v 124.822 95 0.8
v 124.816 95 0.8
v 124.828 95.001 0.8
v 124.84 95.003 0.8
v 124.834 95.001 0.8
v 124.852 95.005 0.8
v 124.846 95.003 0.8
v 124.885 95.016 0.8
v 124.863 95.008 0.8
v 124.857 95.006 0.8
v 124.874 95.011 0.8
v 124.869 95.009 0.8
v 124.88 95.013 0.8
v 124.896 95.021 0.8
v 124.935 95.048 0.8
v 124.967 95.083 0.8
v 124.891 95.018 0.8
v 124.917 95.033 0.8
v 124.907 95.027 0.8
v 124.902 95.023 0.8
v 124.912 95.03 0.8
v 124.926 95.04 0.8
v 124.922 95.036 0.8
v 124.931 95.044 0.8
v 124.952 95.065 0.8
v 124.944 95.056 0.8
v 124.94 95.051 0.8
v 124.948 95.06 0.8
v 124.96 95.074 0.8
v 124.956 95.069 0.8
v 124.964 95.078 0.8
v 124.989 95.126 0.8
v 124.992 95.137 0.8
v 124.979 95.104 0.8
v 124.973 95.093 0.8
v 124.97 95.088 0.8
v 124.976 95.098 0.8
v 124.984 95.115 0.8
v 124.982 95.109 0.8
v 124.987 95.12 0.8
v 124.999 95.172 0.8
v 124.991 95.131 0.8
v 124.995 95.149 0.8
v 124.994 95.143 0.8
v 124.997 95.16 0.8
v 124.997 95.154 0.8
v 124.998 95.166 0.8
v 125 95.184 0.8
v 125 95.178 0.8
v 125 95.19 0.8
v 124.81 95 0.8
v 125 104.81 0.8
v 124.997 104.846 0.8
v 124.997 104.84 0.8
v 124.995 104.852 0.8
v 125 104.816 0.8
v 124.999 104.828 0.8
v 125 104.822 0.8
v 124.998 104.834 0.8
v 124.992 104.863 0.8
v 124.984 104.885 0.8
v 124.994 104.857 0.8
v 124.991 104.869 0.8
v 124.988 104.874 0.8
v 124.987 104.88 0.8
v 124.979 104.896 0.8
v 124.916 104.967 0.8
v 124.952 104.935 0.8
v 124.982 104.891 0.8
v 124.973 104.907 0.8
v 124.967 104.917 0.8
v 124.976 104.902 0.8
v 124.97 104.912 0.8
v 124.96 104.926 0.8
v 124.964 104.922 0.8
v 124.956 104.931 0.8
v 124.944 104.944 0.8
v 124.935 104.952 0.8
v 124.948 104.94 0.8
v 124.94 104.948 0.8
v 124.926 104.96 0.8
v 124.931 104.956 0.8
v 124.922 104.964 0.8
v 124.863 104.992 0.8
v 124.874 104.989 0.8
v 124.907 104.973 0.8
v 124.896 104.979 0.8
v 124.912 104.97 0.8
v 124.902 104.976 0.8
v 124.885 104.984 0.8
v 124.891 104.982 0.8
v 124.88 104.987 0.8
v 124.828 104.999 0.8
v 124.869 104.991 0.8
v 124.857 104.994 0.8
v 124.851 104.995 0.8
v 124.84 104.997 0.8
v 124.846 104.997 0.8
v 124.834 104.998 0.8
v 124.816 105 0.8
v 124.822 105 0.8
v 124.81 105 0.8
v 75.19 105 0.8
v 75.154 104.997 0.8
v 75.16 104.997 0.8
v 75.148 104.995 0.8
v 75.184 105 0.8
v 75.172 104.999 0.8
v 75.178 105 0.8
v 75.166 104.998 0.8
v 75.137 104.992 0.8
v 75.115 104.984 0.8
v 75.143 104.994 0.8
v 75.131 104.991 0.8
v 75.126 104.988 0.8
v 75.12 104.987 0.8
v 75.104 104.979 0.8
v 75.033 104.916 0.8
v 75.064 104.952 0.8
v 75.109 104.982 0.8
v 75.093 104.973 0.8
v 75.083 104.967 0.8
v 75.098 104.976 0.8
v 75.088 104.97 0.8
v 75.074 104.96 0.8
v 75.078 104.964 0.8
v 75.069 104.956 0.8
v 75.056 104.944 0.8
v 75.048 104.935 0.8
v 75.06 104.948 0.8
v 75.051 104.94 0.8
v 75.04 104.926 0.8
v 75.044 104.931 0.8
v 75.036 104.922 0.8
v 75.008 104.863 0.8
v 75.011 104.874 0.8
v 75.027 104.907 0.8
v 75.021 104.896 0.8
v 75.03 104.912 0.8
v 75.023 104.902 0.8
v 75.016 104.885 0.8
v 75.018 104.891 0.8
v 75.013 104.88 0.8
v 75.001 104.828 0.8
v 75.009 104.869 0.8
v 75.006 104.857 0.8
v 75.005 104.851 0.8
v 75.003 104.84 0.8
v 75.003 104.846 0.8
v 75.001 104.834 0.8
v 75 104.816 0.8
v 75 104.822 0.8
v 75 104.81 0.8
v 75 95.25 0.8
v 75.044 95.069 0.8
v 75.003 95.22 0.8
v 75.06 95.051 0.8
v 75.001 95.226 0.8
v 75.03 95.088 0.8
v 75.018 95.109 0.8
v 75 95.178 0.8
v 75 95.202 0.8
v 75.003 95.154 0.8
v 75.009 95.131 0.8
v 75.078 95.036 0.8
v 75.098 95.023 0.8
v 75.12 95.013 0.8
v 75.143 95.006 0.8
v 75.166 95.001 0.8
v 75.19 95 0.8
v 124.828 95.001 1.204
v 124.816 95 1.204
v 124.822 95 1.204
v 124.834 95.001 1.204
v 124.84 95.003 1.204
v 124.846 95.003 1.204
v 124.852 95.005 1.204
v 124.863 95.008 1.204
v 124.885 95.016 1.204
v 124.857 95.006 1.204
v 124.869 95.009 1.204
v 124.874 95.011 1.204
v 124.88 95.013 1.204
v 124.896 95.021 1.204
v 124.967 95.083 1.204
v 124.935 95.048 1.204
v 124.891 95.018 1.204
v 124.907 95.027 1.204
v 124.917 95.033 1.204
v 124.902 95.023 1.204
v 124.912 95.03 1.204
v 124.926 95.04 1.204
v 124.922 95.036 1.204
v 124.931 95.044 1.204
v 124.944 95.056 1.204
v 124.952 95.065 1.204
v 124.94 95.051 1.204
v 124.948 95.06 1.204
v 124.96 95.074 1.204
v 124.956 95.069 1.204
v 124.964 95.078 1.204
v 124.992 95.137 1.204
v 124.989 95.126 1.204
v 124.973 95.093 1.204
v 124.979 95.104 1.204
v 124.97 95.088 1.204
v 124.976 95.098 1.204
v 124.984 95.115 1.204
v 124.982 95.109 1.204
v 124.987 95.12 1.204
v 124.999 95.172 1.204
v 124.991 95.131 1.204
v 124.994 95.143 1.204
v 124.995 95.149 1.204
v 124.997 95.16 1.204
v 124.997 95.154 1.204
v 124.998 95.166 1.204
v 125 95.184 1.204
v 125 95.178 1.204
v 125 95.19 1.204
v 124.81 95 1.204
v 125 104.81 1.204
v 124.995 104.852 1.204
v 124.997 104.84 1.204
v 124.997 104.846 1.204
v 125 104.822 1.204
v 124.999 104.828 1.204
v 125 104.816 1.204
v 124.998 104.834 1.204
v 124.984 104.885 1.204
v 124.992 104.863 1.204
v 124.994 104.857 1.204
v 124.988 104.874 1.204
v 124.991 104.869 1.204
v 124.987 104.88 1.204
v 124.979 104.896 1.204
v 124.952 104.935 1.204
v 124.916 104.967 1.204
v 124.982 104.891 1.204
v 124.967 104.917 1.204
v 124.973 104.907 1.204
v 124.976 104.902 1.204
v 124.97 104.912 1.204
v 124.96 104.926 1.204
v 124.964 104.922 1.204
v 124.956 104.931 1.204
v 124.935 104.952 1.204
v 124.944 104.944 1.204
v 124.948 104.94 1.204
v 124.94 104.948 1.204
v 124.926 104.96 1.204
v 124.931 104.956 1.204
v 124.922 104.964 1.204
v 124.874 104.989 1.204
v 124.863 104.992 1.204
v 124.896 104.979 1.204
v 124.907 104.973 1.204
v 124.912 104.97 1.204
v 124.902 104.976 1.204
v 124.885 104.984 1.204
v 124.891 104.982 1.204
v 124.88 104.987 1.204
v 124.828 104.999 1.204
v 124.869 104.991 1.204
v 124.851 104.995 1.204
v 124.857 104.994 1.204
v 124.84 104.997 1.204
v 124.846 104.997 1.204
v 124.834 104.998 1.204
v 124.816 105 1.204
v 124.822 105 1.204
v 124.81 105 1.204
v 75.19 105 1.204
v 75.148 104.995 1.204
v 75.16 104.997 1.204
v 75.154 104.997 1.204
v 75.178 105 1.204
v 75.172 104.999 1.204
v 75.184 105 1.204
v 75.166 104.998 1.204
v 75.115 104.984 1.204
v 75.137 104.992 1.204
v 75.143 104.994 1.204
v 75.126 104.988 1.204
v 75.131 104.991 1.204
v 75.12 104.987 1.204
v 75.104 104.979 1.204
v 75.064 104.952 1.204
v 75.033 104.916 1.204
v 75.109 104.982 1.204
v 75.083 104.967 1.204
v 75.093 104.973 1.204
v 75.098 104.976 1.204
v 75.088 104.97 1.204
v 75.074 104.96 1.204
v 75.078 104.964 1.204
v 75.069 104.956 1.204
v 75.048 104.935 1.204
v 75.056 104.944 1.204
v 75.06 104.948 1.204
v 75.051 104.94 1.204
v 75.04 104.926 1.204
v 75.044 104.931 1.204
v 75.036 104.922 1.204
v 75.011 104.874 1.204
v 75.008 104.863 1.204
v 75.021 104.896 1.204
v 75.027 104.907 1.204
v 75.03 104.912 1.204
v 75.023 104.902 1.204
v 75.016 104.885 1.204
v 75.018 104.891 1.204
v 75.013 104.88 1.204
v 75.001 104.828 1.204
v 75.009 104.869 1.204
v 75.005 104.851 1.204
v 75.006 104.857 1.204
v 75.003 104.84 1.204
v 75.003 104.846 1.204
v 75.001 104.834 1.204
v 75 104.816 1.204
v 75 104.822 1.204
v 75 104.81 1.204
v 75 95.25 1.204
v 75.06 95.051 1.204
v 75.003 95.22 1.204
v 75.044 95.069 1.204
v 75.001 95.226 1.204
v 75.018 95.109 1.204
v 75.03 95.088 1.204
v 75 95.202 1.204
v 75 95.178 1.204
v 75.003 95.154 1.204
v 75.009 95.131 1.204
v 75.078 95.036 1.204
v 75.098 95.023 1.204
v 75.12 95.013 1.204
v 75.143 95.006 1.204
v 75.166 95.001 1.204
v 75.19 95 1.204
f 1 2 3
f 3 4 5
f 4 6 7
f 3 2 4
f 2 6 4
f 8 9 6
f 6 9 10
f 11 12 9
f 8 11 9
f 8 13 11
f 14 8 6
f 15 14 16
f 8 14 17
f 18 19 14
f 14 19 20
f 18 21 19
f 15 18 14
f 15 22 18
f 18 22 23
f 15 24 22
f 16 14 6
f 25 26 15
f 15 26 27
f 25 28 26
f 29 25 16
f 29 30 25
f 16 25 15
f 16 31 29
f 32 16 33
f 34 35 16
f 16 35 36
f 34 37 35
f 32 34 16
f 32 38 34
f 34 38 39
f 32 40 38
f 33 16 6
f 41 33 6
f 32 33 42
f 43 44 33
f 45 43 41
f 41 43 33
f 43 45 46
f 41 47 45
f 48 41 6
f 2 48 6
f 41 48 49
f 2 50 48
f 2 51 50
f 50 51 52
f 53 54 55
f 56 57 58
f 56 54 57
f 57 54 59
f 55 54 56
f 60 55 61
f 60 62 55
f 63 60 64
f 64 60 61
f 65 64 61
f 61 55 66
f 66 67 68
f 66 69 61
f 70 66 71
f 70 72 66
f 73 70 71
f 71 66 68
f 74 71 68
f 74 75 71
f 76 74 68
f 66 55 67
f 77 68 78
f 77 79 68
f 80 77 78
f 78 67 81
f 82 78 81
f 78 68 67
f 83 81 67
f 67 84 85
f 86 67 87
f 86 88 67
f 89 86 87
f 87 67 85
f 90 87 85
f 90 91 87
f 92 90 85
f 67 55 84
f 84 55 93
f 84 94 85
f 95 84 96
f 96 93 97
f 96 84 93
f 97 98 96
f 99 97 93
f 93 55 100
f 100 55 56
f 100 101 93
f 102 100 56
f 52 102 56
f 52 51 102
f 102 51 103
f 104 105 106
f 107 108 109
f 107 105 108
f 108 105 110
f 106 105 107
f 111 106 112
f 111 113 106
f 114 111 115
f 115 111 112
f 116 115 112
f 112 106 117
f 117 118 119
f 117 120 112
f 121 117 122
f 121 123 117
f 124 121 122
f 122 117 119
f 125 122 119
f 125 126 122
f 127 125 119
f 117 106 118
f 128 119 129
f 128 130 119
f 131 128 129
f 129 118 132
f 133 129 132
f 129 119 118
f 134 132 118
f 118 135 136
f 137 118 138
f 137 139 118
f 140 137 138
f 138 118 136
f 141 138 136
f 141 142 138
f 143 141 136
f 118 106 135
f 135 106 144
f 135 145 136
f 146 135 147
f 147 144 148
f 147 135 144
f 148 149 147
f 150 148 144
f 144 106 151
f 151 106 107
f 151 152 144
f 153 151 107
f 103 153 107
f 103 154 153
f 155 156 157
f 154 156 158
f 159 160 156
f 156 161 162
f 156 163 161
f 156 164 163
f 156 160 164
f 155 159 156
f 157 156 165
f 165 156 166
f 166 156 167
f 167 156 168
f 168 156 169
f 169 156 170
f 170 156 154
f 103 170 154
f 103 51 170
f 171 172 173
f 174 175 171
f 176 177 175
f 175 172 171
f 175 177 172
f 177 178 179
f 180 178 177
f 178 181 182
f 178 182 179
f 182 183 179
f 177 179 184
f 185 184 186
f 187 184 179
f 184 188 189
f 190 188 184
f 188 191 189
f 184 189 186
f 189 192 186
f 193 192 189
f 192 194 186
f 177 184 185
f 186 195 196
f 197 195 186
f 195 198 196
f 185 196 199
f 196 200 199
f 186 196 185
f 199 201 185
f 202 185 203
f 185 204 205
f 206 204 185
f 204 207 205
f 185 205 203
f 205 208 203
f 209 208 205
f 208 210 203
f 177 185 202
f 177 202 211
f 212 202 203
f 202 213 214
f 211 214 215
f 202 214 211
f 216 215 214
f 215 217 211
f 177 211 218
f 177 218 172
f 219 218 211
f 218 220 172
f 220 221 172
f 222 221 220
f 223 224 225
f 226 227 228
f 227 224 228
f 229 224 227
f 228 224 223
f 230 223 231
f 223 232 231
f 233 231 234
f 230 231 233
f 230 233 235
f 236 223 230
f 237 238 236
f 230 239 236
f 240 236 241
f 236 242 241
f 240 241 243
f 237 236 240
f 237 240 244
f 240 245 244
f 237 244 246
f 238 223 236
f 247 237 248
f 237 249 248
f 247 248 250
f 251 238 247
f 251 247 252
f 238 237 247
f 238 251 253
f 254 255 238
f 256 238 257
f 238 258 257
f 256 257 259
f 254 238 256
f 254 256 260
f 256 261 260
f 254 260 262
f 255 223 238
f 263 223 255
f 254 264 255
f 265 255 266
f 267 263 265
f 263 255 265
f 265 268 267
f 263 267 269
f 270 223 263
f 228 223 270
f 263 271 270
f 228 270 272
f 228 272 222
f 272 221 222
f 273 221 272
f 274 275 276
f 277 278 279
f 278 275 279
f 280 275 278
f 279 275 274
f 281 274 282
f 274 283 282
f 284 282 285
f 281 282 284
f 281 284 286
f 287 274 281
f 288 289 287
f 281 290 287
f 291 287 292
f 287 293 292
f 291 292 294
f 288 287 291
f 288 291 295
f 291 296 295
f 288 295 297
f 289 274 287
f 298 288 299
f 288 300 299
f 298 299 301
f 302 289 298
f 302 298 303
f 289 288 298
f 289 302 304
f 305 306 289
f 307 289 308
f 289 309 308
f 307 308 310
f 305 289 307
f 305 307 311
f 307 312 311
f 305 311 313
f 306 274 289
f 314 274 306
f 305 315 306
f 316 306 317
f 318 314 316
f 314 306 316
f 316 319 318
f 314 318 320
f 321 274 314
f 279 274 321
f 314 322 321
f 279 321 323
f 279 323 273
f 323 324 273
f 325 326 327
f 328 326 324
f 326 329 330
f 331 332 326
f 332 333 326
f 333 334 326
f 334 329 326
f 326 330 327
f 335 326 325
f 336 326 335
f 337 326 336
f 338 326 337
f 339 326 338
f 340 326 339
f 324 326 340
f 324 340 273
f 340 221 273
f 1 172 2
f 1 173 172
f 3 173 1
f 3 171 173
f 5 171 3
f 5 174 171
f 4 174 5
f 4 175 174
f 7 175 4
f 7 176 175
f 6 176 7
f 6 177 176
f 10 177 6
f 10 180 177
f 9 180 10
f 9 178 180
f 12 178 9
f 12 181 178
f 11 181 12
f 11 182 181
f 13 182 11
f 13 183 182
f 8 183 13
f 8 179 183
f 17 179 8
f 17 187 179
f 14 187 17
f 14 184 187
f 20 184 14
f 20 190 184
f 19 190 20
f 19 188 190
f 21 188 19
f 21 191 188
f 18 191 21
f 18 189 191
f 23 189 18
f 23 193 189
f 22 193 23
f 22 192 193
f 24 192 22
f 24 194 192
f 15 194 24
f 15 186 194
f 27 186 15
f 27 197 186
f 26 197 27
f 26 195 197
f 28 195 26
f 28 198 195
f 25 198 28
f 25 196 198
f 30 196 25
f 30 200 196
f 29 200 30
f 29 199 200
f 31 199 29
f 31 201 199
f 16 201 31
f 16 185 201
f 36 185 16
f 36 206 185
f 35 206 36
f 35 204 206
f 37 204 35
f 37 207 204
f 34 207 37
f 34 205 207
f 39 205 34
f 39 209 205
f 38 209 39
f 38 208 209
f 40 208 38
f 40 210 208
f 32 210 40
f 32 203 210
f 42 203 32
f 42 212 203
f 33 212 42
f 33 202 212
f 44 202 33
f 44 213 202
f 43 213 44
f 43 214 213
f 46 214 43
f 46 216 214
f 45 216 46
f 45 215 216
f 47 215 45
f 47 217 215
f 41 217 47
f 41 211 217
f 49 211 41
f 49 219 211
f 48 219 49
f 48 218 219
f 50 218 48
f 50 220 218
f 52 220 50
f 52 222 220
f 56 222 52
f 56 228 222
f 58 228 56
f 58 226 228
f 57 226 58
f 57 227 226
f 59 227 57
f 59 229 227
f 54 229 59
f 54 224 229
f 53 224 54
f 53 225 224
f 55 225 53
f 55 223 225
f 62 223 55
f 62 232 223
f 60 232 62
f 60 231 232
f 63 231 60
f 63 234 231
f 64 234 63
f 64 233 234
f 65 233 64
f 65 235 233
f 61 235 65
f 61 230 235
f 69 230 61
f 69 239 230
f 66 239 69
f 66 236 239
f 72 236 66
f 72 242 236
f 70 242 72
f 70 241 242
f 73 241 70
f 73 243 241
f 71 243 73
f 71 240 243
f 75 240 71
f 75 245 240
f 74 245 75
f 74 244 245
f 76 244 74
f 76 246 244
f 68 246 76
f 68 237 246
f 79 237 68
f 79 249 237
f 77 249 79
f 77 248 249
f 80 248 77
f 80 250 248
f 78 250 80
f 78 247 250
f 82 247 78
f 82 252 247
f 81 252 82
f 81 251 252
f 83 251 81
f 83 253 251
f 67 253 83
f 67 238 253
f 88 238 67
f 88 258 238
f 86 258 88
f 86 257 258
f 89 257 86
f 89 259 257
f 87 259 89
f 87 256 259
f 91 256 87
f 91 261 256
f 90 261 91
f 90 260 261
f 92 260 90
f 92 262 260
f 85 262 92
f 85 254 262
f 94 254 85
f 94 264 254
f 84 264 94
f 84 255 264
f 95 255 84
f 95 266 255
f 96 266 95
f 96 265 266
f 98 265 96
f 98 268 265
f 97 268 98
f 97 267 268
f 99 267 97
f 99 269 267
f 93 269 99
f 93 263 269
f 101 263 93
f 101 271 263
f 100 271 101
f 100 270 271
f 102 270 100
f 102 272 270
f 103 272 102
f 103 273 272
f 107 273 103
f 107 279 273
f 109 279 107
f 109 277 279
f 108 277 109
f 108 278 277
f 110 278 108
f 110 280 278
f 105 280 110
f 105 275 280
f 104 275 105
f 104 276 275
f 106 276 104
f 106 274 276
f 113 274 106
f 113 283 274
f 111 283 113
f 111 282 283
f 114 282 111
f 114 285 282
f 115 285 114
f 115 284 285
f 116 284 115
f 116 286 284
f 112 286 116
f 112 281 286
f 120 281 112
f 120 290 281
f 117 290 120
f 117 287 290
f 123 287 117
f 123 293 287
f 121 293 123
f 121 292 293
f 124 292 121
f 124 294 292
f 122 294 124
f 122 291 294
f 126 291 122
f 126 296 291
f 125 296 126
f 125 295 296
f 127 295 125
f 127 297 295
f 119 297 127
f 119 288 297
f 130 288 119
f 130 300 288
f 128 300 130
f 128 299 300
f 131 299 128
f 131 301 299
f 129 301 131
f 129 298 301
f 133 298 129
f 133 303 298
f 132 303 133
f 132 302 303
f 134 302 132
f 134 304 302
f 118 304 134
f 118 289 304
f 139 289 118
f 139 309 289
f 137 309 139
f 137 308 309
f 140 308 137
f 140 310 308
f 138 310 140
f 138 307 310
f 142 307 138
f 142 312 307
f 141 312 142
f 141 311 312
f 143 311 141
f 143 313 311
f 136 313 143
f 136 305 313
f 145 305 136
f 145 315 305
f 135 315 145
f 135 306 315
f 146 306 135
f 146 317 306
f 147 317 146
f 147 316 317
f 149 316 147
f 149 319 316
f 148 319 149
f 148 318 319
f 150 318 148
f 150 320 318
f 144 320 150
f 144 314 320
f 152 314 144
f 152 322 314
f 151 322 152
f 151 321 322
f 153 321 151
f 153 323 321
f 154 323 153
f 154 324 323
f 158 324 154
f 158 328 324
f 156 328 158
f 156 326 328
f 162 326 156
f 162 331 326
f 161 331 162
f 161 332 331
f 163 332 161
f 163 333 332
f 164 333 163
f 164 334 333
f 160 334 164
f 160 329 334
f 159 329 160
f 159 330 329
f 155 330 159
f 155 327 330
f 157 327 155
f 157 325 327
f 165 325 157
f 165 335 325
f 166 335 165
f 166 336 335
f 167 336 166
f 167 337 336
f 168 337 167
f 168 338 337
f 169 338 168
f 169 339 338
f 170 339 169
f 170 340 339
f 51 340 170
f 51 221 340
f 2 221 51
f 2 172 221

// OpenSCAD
module drawBasicShape(x1, y1, x2, y2, width)
{
	length = sqrt((x1-x2)*(x1-x2) + (y1-y2)*(y1-y2));
	if (width!=0.0) {
		square(size = [width, length], center = false);
		translate([width/2.0, 0, 0]) circle(d=width);
		translate([width/2.0, length, 0]) circle(d=width);
	}
}

module translateAndRotate(x1, y1, x2, y2, width)
{
	if (width != 0.0) {
		angle = atan((y2-y1)/(x2-x1)) +270;
		if (x2>=x1) {
			translate([x1, y1, 0.0]) rotate([0.0, 0.0, angle]) translate([-width/2.0, 0.0, 0.0]) scale([1.0, 1.0, 1.0]) drawBasicShape(x1, y1, x2, y2, width);
		}
		else {
			translate([x1, y1, 0.0]) rotate([0.0, 0.0, angle+180]) translate([-width/2.0, 0.0, 0.0]) scale([1.0, 1.0, 1.0]) drawBasicShape(x1, y1, x2, y2, width);		}
	}
}

$fn=50;

points1 = [
[75.77800000, 95.77800000, 0.00000000],
[124.22200000, 95.77800000, 0.37999548],
[124.22200000, 104.22200000, 0.37997788],
[75.77800000, 104.22200000, 0.37999672],
[75.77800000, 95.83800000, 0.37997423],
[75.48400000, 95.48400000, 0.00000000],
[124.51600000, 95.48400000, 0.37999868],
[124.51600000, 104.51600000, 0.37998977],
[75.48400000, 104.51600000, 0.37999746],
[75.48400000, 95.54400000, 0.37999314],
[75.19000000, 95.19000000, 0.00000000],
[124.81000000, 95.19000000, 0.37999939],
[124.81000000, 104.81000000, 0.38000021],
[75.19000000, 104.81000000, 0.38000060],
[75.19000000, 95.25000000, 0.37999715],
[75.53600000, 95.39000000, 0.00000000],
[76.11100000, 95.94600000, 0.00000000],
[75.94600000, 96.11100000, 0.38038683],
[75.94600000, 96.52800000, 0.38073291],
[76.52800000, 95.94600000, 0.38070298],
[76.94500000, 95.94600000, 0.38073291],
[75.94600000, 96.94500000, 0.38071263],
[75.94600000, 97.36200000, 0.38087711],
[77.36200000, 95.94600000, 0.38071660],
[77.77900000, 95.94600000, 0.38087711],
[75.94600000, 97.77900000, 0.38074196],
[75.94600000, 98.19600000, 0.38087711],
[78.19600000, 95.94600000, 0.38075792],
[78.61300000, 95.94600000, 0.38073291],
[75.94600000, 98.61300000, 0.38076888],
[75.94600000, 99.03000000, 0.38073291],
[79.03000000, 95.94600000, 0.38077689],
[79.44700000, 95.94600000, 0.38073291],
[75.94600000, 99.44700000, 0.38078298],
[75.94600000, 99.86400000, 0.38073291],
[79.86400000, 95.94600000, 0.38077693],
[80.28100000, 95.94600000, 0.38073291],
[75.94600000, 100.28100000, 0.38078185],
[75.94600000, 100.69800000, 0.38073291],
[80.69800000, 95.94600000, 0.38078590],
[81.11500000, 95.94600000, 0.38073291],
[75.94600000, 101.11500000, 0.38078108],
[75.94600000, 101.53300000, 0.38002742],
[81.53300000, 95.94600000, 0.38073180],
[81.95000000, 95.94600000, 0.38073291],
[75.94600000, 101.95000000, 0.38073848],
[75.94600000, 102.36700000, 0.38073291],
[82.36700000, 95.94600000, 0.38073768],
[82.78400000, 95.94600000, 0.38087711],
[75.94600000, 102.78400000, 0.38073697],
[75.94600000, 103.20100000, 0.38087711],
[83.20100000, 95.94600000, 0.38074221],
[83.61800000, 95.94600000, 0.38073291],
[75.94600000, 103.61800000, 0.38075242],
[75.95600000, 104.02400000, 0.38107952],
[84.03500000, 95.94600000, 0.38075541],
[84.45200000, 95.94600000, 0.38073291],
[76.34400000, 104.05400000, 0.38075745],
[76.76100000, 104.05400000, 0.38073291],
[84.86900000, 95.94600000, 0.38075745],
[85.28600000, 95.94600000, 0.38073291],
[77.17800000, 104.05400000, 0.38075745],
[77.59500000, 104.05400000, 0.38073291],
[85.70300000, 95.94600000, 0.38075745],
[86.12000000, 95.94600000, 0.38073291],
[78.01200000, 104.05400000, 0.38075745],
[78.42900000, 104.05400000, 0.38073291],
[86.53700000, 95.94600000, 0.38075745],
[86.95400000, 95.94600000, 0.38073291],
[78.84600000, 104.05400000, 0.38075745],
[79.26300000, 104.05400000, 0.38073291],
[87.37100000, 95.94600000, 0.38075745],
[87.78900000, 95.94600000, 0.38002742],
[79.68000000, 104.05400000, 0.38073927],
[80.09700000, 104.05400000, 0.38073291],
[88.20600000, 95.94600000, 0.38073927],
[88.62300000, 95.94600000, 0.38073291],
[80.51400000, 104.05400000, 0.38073927],
[80.93200000, 104.05400000, 0.38002742],
[89.04000000, 95.94600000, 0.38075745],
[89.45700000, 95.94600000, 0.38073291],
[81.34900000, 104.05400000, 0.38075745],
[81.76600000, 104.05400000, 0.38073291],
[89.87400000, 95.94600000, 0.38075745],
[90.29100000, 95.94600000, 0.38073291],
[82.18300000, 104.05400000, 0.38075745],
[82.60000000, 104.05400000, 0.38073291],
[90.70800000, 95.94600000, 0.38075745],
[91.12500000, 95.94600000, 0.38073291],
[83.01700000, 104.05400000, 0.38075745],
[83.43400000, 104.05400000, 0.38073291],
[91.54200000, 95.94600000, 0.38075745],
[91.95900000, 95.94600000, 0.38073291],
[83.85100000, 104.05400000, 0.38075745],
[84.26800000, 104.05400000, 0.38073291],
[92.37600000, 95.94600000, 0.38075745],
[92.79300000, 95.94600000, 0.38073291],
[84.68500000, 104.05400000, 0.38075745],
[85.10200000, 104.05400000, 0.38073291],
[93.21000000, 95.94600000, 0.38075745],
[93.62700000, 95.94600000, 0.38073291],
[85.51900000, 104.05400000, 0.38075745],
[85.93600000, 104.05400000, 0.38073291],
[94.04400000, 95.94600000, 0.38075745],
[94.46200000, 95.94600000, 0.38002742],
[86.35300000, 104.05400000, 0.38073927],
[86.77000000, 104.05400000, 0.38073291],
[94.87900000, 95.94600000, 0.38073927],
[95.29600000, 95.94600000, 0.38073291],
[87.18800000, 104.05400000, 0.38075745],
[87.60500000, 104.05400000, 0.38073291],
[95.71300000, 95.94600000, 0.38075745],
[96.13000000, 95.94600000, 0.38073291],
[88.02200000, 104.05400000, 0.38075745],
[88.43900000, 104.05400000, 0.38073291],
[96.54700000, 95.94600000, 0.38075745],
[96.96400000, 95.94600000, 0.38073291],
[88.85600000, 104.05400000, 0.38075745],
[89.27300000, 104.05400000, 0.38073291],
[97.38100000, 95.94600000, 0.38075745],
[97.79800000, 95.94600000, 0.38087711],
[89.69000000, 104.05400000, 0.38075221],
[90.10700000, 104.05400000, 0.38087711],
[98.21500000, 95.94600000, 0.38075221],
[98.63200000, 95.94600000, 0.38087711],
[90.52400000, 104.05400000, 0.38075221],
[90.94100000, 104.05400000, 0.38087711],
[99.04900000, 95.94600000, 0.38075221],
[99.46600000, 95.94600000, 0.38087711],
[91.35800000, 104.05400000, 0.38075221],
[91.77500000, 104.05400000, 0.38087711],
[99.88300000, 95.94600000, 0.38075221],
[100.30000000, 95.94600000, 0.38087711],
[92.19200000, 104.05400000, 0.38075221],
[92.60900000, 104.05400000, 0.38087711],
[100.71800000, 95.94600000, 0.38073402],
[101.13500000, 95.94600000, 0.38087711],
[93.02600000, 104.05400000, 0.38073402],
[93.44400000, 104.05400000, 0.38017128],
[101.55200000, 95.94600000, 0.38075221],
[101.96900000, 95.94600000, 0.38087711],
[93.86100000, 104.05400000, 0.38075221],
[94.27800000, 104.05400000, 0.38087711],
[102.38600000, 95.94600000, 0.38075221],
[102.80300000, 95.94600000, 0.38087711],
[94.69500000, 104.05400000, 0.38075221],
[95.11200000, 104.05400000, 0.38087711],
[103.22000000, 95.94600000, 0.38075221],
[103.63700000, 95.94600000, 0.38087711],
[95.52900000, 104.05400000, 0.38075221],
[95.94600000, 104.05400000, 0.38087711],
[104.05400000, 95.94600000, 0.38075221],
[104.47100000, 95.94600000, 0.38087711],
[96.36300000, 104.05400000, 0.38075221],
[96.78000000, 104.05400000, 0.38087711],
[104.88800000, 95.94600000, 0.38075221],
[105.30500000, 95.94600000, 0.38087711],
[97.19700000, 104.05400000, 0.38075221],
[97.61400000, 104.05400000, 0.38087711],
[105.72200000, 95.94600000, 0.38075221],
[106.13900000, 95.94600000, 0.38087711],
[98.03100000, 104.05400000, 0.38075221],
[98.44800000, 104.05400000, 0.38087711],
[106.55600000, 95.94600000, 0.38075221],
[106.97300000, 95.94600000, 0.38087711],
[98.86500000, 104.05400000, 0.38075221],
[99.28200000, 104.05400000, 0.38087711],
[107.39100000, 95.94600000, 0.38073402],
[107.80800000, 95.94600000, 0.38087711],
[99.69900000, 104.05400000, 0.38073402],
[100.11700000, 104.05400000, 0.38017128],
[108.22500000, 95.94600000, 0.38075221],
[108.64200000, 95.94600000, 0.38087711],
[100.53400000, 104.05400000, 0.38075221],
[100.95100000, 104.05400000, 0.38087711],
[109.05900000, 95.94600000, 0.38075221],
[109.47600000, 95.94600000, 0.38087711],
[101.36800000, 104.05400000, 0.38075221],
[101.78500000, 104.05400000, 0.38087711],
[109.89300000, 95.94600000, 0.38075221],
[110.31000000, 95.94600000, 0.38087711],
[102.20200000, 104.05400000, 0.38075745],
[102.61900000, 104.05400000, 0.38073291],
[110.72700000, 95.94600000, 0.38075745],
[111.14400000, 95.94600000, 0.38073291],
[103.03600000, 104.05400000, 0.38075745],
[103.45300000, 104.05400000, 0.38073291],
[111.56100000, 95.94600000, 0.38075745],
[111.97800000, 95.94600000, 0.38073291],
[103.87000000, 104.05400000, 0.38075745],
[104.28700000, 104.05400000, 0.38073291],
[112.39500000, 95.94600000, 0.38075745],
[112.81200000, 95.94600000, 0.38073291],
[104.70400000, 104.05400000, 0.38075745],
[105.12100000, 104.05400000, 0.38073291],
[113.22900000, 95.94600000, 0.38075745],
[113.64700000, 95.94600000, 0.38002742],
[105.53800000, 104.05400000, 0.38073927],
[105.95500000, 104.05400000, 0.38073291],
[114.06400000, 95.94600000, 0.38073927],
[114.48100000, 95.94600000, 0.38073291],
[106.37300000, 104.05400000, 0.38075745],
[106.79000000, 104.05400000, 0.38073291],
[114.89800000, 95.94600000, 0.38075745],
[115.31500000, 95.94600000, 0.38073291],
[107.20700000, 104.05400000, 0.38075745],
[107.62400000, 104.05400000, 0.38073291],
[115.73200000, 95.94600000, 0.38075745],
[116.14900000, 95.94600000, 0.38073291],
[108.04100000, 104.05400000, 0.38075745],
[108.45800000, 104.05400000, 0.38073291],
[116.56600000, 95.94600000, 0.38075745],
[116.98300000, 95.94600000, 0.38073291],
[108.87500000, 104.05400000, 0.38075745],
[109.29200000, 104.05400000, 0.38073291],
[117.40000000, 95.94600000, 0.38075745],
[117.81700000, 95.94600000, 0.38073291],
[109.70900000, 104.05400000, 0.38075745],
[110.12600000, 104.05400000, 0.38073291],
[118.23400000, 95.94600000, 0.38075745],
[118.65100000, 95.94600000, 0.38073291],
[110.54300000, 104.05400000, 0.38075745],
[110.96000000, 104.05400000, 0.38073291],
[119.06800000, 95.94600000, 0.38075745],
[119.48500000, 95.94600000, 0.38073291],
[111.37700000, 104.05400000, 0.38075745],
[111.79400000, 104.05400000, 0.38073291],
[119.90300000, 95.94600000, 0.38073927],
[120.32000000, 95.94600000, 0.38073291],
[112.21100000, 104.05400000, 0.38073927],
[112.62900000, 104.05400000, 0.38002742],
[120.73700000, 95.94600000, 0.38075745],
[121.15400000, 95.94600000, 0.38073291],
[113.04600000, 104.05400000, 0.38075745],
[113.46300000, 104.05400000, 0.38073291],
[121.57100000, 95.94600000, 0.38075745],
[121.98800000, 95.94600000, 0.38073291],
[113.88000000, 104.05400000, 0.38075745],
[114.29700000, 104.05400000, 0.38073291],
[122.40500000, 95.94600000, 0.38075745],
[122.82200000, 95.94600000, 0.38073291],
[114.71400000, 104.05400000, 0.38075745],
[115.13100000, 104.05400000, 0.38073291],
[123.23900000, 95.94600000, 0.38075745],
[123.65600000, 95.94600000, 0.38073291],
[115.54800000, 104.05400000, 0.38075745],
[115.96500000, 104.05400000, 0.38073291],
[124.04400000, 95.97500000, 0.38073716],
[124.05400000, 96.38200000, 0.38050226],
[116.38200000, 104.05400000, 0.38074688],
[116.79900000, 104.05400000, 0.38087711],
[124.05400000, 96.79900000, 0.38074221],
[124.05400000, 97.21600000, 0.38087711],
[117.21600000, 104.05400000, 0.38074319],
[117.63300000, 104.05400000, 0.38073291],
[124.05400000, 97.63300000, 0.38074430],
[124.05400000, 98.05000000, 0.38073291],
[118.05000000, 104.05400000, 0.38073848],
[118.46700000, 104.05400000, 0.38073291],
[124.05400000, 98.46700000, 0.38073180],
[124.05400000, 98.88400000, 0.38087711],
[118.88400000, 104.05400000, 0.38072403],
[119.30200000, 104.05400000, 0.38002742],
[124.05400000, 99.30200000, 0.38078590],
[124.05400000, 99.71900000, 0.38073291],
[119.71900000, 104.05400000, 0.38078185],
[120.13600000, 104.05400000, 0.38087711],
[124.05400000, 100.13600000, 0.38077693],
[124.05400000, 100.55300000, 0.38073291],
[120.55300000, 104.05400000, 0.38078298],
[120.97000000, 104.05400000, 0.38073291],
[124.05400000, 100.97000000, 0.38077689],
[124.05400000, 101.38700000, 0.38087711],
[121.38700000, 104.05400000, 0.38076888],
[121.80400000, 104.05400000, 0.38073291],
[124.05400000, 101.80400000, 0.38077681],
[124.05400000, 102.22100000, 0.38073291],
[122.22100000, 104.05400000, 0.38076515],
[122.63800000, 104.05400000, 0.38073291],
[124.05400000, 102.63800000, 0.38077665],
[124.05400000, 103.05500000, 0.38073291],
[123.05500000, 104.05400000, 0.38071263],
[123.47200000, 104.05400000, 0.38087711],
[124.05400000, 103.47200000, 0.38070298],
[124.05400000, 103.88900000, 0.38073291],
[123.88900000, 104.05400000, 0.38038683],
];

translate([0.0, 0.0, 0.80000000]) {
	linear_extrude(height = 0.40400000, center = false, convexity = 10, twist = 0) {
		union() {
			for( i=[0:len(points1)-2] ){ 
				x1 = points1[i][0];
				y1 = points1[i][1];
				x2 = points1[i+1][0];
				y2 = points1[i+1][1];
				width = points1[i+1][2];
				translateAndRotate(x1, y1, x2, y2, width);
			}
		}
	}
}
